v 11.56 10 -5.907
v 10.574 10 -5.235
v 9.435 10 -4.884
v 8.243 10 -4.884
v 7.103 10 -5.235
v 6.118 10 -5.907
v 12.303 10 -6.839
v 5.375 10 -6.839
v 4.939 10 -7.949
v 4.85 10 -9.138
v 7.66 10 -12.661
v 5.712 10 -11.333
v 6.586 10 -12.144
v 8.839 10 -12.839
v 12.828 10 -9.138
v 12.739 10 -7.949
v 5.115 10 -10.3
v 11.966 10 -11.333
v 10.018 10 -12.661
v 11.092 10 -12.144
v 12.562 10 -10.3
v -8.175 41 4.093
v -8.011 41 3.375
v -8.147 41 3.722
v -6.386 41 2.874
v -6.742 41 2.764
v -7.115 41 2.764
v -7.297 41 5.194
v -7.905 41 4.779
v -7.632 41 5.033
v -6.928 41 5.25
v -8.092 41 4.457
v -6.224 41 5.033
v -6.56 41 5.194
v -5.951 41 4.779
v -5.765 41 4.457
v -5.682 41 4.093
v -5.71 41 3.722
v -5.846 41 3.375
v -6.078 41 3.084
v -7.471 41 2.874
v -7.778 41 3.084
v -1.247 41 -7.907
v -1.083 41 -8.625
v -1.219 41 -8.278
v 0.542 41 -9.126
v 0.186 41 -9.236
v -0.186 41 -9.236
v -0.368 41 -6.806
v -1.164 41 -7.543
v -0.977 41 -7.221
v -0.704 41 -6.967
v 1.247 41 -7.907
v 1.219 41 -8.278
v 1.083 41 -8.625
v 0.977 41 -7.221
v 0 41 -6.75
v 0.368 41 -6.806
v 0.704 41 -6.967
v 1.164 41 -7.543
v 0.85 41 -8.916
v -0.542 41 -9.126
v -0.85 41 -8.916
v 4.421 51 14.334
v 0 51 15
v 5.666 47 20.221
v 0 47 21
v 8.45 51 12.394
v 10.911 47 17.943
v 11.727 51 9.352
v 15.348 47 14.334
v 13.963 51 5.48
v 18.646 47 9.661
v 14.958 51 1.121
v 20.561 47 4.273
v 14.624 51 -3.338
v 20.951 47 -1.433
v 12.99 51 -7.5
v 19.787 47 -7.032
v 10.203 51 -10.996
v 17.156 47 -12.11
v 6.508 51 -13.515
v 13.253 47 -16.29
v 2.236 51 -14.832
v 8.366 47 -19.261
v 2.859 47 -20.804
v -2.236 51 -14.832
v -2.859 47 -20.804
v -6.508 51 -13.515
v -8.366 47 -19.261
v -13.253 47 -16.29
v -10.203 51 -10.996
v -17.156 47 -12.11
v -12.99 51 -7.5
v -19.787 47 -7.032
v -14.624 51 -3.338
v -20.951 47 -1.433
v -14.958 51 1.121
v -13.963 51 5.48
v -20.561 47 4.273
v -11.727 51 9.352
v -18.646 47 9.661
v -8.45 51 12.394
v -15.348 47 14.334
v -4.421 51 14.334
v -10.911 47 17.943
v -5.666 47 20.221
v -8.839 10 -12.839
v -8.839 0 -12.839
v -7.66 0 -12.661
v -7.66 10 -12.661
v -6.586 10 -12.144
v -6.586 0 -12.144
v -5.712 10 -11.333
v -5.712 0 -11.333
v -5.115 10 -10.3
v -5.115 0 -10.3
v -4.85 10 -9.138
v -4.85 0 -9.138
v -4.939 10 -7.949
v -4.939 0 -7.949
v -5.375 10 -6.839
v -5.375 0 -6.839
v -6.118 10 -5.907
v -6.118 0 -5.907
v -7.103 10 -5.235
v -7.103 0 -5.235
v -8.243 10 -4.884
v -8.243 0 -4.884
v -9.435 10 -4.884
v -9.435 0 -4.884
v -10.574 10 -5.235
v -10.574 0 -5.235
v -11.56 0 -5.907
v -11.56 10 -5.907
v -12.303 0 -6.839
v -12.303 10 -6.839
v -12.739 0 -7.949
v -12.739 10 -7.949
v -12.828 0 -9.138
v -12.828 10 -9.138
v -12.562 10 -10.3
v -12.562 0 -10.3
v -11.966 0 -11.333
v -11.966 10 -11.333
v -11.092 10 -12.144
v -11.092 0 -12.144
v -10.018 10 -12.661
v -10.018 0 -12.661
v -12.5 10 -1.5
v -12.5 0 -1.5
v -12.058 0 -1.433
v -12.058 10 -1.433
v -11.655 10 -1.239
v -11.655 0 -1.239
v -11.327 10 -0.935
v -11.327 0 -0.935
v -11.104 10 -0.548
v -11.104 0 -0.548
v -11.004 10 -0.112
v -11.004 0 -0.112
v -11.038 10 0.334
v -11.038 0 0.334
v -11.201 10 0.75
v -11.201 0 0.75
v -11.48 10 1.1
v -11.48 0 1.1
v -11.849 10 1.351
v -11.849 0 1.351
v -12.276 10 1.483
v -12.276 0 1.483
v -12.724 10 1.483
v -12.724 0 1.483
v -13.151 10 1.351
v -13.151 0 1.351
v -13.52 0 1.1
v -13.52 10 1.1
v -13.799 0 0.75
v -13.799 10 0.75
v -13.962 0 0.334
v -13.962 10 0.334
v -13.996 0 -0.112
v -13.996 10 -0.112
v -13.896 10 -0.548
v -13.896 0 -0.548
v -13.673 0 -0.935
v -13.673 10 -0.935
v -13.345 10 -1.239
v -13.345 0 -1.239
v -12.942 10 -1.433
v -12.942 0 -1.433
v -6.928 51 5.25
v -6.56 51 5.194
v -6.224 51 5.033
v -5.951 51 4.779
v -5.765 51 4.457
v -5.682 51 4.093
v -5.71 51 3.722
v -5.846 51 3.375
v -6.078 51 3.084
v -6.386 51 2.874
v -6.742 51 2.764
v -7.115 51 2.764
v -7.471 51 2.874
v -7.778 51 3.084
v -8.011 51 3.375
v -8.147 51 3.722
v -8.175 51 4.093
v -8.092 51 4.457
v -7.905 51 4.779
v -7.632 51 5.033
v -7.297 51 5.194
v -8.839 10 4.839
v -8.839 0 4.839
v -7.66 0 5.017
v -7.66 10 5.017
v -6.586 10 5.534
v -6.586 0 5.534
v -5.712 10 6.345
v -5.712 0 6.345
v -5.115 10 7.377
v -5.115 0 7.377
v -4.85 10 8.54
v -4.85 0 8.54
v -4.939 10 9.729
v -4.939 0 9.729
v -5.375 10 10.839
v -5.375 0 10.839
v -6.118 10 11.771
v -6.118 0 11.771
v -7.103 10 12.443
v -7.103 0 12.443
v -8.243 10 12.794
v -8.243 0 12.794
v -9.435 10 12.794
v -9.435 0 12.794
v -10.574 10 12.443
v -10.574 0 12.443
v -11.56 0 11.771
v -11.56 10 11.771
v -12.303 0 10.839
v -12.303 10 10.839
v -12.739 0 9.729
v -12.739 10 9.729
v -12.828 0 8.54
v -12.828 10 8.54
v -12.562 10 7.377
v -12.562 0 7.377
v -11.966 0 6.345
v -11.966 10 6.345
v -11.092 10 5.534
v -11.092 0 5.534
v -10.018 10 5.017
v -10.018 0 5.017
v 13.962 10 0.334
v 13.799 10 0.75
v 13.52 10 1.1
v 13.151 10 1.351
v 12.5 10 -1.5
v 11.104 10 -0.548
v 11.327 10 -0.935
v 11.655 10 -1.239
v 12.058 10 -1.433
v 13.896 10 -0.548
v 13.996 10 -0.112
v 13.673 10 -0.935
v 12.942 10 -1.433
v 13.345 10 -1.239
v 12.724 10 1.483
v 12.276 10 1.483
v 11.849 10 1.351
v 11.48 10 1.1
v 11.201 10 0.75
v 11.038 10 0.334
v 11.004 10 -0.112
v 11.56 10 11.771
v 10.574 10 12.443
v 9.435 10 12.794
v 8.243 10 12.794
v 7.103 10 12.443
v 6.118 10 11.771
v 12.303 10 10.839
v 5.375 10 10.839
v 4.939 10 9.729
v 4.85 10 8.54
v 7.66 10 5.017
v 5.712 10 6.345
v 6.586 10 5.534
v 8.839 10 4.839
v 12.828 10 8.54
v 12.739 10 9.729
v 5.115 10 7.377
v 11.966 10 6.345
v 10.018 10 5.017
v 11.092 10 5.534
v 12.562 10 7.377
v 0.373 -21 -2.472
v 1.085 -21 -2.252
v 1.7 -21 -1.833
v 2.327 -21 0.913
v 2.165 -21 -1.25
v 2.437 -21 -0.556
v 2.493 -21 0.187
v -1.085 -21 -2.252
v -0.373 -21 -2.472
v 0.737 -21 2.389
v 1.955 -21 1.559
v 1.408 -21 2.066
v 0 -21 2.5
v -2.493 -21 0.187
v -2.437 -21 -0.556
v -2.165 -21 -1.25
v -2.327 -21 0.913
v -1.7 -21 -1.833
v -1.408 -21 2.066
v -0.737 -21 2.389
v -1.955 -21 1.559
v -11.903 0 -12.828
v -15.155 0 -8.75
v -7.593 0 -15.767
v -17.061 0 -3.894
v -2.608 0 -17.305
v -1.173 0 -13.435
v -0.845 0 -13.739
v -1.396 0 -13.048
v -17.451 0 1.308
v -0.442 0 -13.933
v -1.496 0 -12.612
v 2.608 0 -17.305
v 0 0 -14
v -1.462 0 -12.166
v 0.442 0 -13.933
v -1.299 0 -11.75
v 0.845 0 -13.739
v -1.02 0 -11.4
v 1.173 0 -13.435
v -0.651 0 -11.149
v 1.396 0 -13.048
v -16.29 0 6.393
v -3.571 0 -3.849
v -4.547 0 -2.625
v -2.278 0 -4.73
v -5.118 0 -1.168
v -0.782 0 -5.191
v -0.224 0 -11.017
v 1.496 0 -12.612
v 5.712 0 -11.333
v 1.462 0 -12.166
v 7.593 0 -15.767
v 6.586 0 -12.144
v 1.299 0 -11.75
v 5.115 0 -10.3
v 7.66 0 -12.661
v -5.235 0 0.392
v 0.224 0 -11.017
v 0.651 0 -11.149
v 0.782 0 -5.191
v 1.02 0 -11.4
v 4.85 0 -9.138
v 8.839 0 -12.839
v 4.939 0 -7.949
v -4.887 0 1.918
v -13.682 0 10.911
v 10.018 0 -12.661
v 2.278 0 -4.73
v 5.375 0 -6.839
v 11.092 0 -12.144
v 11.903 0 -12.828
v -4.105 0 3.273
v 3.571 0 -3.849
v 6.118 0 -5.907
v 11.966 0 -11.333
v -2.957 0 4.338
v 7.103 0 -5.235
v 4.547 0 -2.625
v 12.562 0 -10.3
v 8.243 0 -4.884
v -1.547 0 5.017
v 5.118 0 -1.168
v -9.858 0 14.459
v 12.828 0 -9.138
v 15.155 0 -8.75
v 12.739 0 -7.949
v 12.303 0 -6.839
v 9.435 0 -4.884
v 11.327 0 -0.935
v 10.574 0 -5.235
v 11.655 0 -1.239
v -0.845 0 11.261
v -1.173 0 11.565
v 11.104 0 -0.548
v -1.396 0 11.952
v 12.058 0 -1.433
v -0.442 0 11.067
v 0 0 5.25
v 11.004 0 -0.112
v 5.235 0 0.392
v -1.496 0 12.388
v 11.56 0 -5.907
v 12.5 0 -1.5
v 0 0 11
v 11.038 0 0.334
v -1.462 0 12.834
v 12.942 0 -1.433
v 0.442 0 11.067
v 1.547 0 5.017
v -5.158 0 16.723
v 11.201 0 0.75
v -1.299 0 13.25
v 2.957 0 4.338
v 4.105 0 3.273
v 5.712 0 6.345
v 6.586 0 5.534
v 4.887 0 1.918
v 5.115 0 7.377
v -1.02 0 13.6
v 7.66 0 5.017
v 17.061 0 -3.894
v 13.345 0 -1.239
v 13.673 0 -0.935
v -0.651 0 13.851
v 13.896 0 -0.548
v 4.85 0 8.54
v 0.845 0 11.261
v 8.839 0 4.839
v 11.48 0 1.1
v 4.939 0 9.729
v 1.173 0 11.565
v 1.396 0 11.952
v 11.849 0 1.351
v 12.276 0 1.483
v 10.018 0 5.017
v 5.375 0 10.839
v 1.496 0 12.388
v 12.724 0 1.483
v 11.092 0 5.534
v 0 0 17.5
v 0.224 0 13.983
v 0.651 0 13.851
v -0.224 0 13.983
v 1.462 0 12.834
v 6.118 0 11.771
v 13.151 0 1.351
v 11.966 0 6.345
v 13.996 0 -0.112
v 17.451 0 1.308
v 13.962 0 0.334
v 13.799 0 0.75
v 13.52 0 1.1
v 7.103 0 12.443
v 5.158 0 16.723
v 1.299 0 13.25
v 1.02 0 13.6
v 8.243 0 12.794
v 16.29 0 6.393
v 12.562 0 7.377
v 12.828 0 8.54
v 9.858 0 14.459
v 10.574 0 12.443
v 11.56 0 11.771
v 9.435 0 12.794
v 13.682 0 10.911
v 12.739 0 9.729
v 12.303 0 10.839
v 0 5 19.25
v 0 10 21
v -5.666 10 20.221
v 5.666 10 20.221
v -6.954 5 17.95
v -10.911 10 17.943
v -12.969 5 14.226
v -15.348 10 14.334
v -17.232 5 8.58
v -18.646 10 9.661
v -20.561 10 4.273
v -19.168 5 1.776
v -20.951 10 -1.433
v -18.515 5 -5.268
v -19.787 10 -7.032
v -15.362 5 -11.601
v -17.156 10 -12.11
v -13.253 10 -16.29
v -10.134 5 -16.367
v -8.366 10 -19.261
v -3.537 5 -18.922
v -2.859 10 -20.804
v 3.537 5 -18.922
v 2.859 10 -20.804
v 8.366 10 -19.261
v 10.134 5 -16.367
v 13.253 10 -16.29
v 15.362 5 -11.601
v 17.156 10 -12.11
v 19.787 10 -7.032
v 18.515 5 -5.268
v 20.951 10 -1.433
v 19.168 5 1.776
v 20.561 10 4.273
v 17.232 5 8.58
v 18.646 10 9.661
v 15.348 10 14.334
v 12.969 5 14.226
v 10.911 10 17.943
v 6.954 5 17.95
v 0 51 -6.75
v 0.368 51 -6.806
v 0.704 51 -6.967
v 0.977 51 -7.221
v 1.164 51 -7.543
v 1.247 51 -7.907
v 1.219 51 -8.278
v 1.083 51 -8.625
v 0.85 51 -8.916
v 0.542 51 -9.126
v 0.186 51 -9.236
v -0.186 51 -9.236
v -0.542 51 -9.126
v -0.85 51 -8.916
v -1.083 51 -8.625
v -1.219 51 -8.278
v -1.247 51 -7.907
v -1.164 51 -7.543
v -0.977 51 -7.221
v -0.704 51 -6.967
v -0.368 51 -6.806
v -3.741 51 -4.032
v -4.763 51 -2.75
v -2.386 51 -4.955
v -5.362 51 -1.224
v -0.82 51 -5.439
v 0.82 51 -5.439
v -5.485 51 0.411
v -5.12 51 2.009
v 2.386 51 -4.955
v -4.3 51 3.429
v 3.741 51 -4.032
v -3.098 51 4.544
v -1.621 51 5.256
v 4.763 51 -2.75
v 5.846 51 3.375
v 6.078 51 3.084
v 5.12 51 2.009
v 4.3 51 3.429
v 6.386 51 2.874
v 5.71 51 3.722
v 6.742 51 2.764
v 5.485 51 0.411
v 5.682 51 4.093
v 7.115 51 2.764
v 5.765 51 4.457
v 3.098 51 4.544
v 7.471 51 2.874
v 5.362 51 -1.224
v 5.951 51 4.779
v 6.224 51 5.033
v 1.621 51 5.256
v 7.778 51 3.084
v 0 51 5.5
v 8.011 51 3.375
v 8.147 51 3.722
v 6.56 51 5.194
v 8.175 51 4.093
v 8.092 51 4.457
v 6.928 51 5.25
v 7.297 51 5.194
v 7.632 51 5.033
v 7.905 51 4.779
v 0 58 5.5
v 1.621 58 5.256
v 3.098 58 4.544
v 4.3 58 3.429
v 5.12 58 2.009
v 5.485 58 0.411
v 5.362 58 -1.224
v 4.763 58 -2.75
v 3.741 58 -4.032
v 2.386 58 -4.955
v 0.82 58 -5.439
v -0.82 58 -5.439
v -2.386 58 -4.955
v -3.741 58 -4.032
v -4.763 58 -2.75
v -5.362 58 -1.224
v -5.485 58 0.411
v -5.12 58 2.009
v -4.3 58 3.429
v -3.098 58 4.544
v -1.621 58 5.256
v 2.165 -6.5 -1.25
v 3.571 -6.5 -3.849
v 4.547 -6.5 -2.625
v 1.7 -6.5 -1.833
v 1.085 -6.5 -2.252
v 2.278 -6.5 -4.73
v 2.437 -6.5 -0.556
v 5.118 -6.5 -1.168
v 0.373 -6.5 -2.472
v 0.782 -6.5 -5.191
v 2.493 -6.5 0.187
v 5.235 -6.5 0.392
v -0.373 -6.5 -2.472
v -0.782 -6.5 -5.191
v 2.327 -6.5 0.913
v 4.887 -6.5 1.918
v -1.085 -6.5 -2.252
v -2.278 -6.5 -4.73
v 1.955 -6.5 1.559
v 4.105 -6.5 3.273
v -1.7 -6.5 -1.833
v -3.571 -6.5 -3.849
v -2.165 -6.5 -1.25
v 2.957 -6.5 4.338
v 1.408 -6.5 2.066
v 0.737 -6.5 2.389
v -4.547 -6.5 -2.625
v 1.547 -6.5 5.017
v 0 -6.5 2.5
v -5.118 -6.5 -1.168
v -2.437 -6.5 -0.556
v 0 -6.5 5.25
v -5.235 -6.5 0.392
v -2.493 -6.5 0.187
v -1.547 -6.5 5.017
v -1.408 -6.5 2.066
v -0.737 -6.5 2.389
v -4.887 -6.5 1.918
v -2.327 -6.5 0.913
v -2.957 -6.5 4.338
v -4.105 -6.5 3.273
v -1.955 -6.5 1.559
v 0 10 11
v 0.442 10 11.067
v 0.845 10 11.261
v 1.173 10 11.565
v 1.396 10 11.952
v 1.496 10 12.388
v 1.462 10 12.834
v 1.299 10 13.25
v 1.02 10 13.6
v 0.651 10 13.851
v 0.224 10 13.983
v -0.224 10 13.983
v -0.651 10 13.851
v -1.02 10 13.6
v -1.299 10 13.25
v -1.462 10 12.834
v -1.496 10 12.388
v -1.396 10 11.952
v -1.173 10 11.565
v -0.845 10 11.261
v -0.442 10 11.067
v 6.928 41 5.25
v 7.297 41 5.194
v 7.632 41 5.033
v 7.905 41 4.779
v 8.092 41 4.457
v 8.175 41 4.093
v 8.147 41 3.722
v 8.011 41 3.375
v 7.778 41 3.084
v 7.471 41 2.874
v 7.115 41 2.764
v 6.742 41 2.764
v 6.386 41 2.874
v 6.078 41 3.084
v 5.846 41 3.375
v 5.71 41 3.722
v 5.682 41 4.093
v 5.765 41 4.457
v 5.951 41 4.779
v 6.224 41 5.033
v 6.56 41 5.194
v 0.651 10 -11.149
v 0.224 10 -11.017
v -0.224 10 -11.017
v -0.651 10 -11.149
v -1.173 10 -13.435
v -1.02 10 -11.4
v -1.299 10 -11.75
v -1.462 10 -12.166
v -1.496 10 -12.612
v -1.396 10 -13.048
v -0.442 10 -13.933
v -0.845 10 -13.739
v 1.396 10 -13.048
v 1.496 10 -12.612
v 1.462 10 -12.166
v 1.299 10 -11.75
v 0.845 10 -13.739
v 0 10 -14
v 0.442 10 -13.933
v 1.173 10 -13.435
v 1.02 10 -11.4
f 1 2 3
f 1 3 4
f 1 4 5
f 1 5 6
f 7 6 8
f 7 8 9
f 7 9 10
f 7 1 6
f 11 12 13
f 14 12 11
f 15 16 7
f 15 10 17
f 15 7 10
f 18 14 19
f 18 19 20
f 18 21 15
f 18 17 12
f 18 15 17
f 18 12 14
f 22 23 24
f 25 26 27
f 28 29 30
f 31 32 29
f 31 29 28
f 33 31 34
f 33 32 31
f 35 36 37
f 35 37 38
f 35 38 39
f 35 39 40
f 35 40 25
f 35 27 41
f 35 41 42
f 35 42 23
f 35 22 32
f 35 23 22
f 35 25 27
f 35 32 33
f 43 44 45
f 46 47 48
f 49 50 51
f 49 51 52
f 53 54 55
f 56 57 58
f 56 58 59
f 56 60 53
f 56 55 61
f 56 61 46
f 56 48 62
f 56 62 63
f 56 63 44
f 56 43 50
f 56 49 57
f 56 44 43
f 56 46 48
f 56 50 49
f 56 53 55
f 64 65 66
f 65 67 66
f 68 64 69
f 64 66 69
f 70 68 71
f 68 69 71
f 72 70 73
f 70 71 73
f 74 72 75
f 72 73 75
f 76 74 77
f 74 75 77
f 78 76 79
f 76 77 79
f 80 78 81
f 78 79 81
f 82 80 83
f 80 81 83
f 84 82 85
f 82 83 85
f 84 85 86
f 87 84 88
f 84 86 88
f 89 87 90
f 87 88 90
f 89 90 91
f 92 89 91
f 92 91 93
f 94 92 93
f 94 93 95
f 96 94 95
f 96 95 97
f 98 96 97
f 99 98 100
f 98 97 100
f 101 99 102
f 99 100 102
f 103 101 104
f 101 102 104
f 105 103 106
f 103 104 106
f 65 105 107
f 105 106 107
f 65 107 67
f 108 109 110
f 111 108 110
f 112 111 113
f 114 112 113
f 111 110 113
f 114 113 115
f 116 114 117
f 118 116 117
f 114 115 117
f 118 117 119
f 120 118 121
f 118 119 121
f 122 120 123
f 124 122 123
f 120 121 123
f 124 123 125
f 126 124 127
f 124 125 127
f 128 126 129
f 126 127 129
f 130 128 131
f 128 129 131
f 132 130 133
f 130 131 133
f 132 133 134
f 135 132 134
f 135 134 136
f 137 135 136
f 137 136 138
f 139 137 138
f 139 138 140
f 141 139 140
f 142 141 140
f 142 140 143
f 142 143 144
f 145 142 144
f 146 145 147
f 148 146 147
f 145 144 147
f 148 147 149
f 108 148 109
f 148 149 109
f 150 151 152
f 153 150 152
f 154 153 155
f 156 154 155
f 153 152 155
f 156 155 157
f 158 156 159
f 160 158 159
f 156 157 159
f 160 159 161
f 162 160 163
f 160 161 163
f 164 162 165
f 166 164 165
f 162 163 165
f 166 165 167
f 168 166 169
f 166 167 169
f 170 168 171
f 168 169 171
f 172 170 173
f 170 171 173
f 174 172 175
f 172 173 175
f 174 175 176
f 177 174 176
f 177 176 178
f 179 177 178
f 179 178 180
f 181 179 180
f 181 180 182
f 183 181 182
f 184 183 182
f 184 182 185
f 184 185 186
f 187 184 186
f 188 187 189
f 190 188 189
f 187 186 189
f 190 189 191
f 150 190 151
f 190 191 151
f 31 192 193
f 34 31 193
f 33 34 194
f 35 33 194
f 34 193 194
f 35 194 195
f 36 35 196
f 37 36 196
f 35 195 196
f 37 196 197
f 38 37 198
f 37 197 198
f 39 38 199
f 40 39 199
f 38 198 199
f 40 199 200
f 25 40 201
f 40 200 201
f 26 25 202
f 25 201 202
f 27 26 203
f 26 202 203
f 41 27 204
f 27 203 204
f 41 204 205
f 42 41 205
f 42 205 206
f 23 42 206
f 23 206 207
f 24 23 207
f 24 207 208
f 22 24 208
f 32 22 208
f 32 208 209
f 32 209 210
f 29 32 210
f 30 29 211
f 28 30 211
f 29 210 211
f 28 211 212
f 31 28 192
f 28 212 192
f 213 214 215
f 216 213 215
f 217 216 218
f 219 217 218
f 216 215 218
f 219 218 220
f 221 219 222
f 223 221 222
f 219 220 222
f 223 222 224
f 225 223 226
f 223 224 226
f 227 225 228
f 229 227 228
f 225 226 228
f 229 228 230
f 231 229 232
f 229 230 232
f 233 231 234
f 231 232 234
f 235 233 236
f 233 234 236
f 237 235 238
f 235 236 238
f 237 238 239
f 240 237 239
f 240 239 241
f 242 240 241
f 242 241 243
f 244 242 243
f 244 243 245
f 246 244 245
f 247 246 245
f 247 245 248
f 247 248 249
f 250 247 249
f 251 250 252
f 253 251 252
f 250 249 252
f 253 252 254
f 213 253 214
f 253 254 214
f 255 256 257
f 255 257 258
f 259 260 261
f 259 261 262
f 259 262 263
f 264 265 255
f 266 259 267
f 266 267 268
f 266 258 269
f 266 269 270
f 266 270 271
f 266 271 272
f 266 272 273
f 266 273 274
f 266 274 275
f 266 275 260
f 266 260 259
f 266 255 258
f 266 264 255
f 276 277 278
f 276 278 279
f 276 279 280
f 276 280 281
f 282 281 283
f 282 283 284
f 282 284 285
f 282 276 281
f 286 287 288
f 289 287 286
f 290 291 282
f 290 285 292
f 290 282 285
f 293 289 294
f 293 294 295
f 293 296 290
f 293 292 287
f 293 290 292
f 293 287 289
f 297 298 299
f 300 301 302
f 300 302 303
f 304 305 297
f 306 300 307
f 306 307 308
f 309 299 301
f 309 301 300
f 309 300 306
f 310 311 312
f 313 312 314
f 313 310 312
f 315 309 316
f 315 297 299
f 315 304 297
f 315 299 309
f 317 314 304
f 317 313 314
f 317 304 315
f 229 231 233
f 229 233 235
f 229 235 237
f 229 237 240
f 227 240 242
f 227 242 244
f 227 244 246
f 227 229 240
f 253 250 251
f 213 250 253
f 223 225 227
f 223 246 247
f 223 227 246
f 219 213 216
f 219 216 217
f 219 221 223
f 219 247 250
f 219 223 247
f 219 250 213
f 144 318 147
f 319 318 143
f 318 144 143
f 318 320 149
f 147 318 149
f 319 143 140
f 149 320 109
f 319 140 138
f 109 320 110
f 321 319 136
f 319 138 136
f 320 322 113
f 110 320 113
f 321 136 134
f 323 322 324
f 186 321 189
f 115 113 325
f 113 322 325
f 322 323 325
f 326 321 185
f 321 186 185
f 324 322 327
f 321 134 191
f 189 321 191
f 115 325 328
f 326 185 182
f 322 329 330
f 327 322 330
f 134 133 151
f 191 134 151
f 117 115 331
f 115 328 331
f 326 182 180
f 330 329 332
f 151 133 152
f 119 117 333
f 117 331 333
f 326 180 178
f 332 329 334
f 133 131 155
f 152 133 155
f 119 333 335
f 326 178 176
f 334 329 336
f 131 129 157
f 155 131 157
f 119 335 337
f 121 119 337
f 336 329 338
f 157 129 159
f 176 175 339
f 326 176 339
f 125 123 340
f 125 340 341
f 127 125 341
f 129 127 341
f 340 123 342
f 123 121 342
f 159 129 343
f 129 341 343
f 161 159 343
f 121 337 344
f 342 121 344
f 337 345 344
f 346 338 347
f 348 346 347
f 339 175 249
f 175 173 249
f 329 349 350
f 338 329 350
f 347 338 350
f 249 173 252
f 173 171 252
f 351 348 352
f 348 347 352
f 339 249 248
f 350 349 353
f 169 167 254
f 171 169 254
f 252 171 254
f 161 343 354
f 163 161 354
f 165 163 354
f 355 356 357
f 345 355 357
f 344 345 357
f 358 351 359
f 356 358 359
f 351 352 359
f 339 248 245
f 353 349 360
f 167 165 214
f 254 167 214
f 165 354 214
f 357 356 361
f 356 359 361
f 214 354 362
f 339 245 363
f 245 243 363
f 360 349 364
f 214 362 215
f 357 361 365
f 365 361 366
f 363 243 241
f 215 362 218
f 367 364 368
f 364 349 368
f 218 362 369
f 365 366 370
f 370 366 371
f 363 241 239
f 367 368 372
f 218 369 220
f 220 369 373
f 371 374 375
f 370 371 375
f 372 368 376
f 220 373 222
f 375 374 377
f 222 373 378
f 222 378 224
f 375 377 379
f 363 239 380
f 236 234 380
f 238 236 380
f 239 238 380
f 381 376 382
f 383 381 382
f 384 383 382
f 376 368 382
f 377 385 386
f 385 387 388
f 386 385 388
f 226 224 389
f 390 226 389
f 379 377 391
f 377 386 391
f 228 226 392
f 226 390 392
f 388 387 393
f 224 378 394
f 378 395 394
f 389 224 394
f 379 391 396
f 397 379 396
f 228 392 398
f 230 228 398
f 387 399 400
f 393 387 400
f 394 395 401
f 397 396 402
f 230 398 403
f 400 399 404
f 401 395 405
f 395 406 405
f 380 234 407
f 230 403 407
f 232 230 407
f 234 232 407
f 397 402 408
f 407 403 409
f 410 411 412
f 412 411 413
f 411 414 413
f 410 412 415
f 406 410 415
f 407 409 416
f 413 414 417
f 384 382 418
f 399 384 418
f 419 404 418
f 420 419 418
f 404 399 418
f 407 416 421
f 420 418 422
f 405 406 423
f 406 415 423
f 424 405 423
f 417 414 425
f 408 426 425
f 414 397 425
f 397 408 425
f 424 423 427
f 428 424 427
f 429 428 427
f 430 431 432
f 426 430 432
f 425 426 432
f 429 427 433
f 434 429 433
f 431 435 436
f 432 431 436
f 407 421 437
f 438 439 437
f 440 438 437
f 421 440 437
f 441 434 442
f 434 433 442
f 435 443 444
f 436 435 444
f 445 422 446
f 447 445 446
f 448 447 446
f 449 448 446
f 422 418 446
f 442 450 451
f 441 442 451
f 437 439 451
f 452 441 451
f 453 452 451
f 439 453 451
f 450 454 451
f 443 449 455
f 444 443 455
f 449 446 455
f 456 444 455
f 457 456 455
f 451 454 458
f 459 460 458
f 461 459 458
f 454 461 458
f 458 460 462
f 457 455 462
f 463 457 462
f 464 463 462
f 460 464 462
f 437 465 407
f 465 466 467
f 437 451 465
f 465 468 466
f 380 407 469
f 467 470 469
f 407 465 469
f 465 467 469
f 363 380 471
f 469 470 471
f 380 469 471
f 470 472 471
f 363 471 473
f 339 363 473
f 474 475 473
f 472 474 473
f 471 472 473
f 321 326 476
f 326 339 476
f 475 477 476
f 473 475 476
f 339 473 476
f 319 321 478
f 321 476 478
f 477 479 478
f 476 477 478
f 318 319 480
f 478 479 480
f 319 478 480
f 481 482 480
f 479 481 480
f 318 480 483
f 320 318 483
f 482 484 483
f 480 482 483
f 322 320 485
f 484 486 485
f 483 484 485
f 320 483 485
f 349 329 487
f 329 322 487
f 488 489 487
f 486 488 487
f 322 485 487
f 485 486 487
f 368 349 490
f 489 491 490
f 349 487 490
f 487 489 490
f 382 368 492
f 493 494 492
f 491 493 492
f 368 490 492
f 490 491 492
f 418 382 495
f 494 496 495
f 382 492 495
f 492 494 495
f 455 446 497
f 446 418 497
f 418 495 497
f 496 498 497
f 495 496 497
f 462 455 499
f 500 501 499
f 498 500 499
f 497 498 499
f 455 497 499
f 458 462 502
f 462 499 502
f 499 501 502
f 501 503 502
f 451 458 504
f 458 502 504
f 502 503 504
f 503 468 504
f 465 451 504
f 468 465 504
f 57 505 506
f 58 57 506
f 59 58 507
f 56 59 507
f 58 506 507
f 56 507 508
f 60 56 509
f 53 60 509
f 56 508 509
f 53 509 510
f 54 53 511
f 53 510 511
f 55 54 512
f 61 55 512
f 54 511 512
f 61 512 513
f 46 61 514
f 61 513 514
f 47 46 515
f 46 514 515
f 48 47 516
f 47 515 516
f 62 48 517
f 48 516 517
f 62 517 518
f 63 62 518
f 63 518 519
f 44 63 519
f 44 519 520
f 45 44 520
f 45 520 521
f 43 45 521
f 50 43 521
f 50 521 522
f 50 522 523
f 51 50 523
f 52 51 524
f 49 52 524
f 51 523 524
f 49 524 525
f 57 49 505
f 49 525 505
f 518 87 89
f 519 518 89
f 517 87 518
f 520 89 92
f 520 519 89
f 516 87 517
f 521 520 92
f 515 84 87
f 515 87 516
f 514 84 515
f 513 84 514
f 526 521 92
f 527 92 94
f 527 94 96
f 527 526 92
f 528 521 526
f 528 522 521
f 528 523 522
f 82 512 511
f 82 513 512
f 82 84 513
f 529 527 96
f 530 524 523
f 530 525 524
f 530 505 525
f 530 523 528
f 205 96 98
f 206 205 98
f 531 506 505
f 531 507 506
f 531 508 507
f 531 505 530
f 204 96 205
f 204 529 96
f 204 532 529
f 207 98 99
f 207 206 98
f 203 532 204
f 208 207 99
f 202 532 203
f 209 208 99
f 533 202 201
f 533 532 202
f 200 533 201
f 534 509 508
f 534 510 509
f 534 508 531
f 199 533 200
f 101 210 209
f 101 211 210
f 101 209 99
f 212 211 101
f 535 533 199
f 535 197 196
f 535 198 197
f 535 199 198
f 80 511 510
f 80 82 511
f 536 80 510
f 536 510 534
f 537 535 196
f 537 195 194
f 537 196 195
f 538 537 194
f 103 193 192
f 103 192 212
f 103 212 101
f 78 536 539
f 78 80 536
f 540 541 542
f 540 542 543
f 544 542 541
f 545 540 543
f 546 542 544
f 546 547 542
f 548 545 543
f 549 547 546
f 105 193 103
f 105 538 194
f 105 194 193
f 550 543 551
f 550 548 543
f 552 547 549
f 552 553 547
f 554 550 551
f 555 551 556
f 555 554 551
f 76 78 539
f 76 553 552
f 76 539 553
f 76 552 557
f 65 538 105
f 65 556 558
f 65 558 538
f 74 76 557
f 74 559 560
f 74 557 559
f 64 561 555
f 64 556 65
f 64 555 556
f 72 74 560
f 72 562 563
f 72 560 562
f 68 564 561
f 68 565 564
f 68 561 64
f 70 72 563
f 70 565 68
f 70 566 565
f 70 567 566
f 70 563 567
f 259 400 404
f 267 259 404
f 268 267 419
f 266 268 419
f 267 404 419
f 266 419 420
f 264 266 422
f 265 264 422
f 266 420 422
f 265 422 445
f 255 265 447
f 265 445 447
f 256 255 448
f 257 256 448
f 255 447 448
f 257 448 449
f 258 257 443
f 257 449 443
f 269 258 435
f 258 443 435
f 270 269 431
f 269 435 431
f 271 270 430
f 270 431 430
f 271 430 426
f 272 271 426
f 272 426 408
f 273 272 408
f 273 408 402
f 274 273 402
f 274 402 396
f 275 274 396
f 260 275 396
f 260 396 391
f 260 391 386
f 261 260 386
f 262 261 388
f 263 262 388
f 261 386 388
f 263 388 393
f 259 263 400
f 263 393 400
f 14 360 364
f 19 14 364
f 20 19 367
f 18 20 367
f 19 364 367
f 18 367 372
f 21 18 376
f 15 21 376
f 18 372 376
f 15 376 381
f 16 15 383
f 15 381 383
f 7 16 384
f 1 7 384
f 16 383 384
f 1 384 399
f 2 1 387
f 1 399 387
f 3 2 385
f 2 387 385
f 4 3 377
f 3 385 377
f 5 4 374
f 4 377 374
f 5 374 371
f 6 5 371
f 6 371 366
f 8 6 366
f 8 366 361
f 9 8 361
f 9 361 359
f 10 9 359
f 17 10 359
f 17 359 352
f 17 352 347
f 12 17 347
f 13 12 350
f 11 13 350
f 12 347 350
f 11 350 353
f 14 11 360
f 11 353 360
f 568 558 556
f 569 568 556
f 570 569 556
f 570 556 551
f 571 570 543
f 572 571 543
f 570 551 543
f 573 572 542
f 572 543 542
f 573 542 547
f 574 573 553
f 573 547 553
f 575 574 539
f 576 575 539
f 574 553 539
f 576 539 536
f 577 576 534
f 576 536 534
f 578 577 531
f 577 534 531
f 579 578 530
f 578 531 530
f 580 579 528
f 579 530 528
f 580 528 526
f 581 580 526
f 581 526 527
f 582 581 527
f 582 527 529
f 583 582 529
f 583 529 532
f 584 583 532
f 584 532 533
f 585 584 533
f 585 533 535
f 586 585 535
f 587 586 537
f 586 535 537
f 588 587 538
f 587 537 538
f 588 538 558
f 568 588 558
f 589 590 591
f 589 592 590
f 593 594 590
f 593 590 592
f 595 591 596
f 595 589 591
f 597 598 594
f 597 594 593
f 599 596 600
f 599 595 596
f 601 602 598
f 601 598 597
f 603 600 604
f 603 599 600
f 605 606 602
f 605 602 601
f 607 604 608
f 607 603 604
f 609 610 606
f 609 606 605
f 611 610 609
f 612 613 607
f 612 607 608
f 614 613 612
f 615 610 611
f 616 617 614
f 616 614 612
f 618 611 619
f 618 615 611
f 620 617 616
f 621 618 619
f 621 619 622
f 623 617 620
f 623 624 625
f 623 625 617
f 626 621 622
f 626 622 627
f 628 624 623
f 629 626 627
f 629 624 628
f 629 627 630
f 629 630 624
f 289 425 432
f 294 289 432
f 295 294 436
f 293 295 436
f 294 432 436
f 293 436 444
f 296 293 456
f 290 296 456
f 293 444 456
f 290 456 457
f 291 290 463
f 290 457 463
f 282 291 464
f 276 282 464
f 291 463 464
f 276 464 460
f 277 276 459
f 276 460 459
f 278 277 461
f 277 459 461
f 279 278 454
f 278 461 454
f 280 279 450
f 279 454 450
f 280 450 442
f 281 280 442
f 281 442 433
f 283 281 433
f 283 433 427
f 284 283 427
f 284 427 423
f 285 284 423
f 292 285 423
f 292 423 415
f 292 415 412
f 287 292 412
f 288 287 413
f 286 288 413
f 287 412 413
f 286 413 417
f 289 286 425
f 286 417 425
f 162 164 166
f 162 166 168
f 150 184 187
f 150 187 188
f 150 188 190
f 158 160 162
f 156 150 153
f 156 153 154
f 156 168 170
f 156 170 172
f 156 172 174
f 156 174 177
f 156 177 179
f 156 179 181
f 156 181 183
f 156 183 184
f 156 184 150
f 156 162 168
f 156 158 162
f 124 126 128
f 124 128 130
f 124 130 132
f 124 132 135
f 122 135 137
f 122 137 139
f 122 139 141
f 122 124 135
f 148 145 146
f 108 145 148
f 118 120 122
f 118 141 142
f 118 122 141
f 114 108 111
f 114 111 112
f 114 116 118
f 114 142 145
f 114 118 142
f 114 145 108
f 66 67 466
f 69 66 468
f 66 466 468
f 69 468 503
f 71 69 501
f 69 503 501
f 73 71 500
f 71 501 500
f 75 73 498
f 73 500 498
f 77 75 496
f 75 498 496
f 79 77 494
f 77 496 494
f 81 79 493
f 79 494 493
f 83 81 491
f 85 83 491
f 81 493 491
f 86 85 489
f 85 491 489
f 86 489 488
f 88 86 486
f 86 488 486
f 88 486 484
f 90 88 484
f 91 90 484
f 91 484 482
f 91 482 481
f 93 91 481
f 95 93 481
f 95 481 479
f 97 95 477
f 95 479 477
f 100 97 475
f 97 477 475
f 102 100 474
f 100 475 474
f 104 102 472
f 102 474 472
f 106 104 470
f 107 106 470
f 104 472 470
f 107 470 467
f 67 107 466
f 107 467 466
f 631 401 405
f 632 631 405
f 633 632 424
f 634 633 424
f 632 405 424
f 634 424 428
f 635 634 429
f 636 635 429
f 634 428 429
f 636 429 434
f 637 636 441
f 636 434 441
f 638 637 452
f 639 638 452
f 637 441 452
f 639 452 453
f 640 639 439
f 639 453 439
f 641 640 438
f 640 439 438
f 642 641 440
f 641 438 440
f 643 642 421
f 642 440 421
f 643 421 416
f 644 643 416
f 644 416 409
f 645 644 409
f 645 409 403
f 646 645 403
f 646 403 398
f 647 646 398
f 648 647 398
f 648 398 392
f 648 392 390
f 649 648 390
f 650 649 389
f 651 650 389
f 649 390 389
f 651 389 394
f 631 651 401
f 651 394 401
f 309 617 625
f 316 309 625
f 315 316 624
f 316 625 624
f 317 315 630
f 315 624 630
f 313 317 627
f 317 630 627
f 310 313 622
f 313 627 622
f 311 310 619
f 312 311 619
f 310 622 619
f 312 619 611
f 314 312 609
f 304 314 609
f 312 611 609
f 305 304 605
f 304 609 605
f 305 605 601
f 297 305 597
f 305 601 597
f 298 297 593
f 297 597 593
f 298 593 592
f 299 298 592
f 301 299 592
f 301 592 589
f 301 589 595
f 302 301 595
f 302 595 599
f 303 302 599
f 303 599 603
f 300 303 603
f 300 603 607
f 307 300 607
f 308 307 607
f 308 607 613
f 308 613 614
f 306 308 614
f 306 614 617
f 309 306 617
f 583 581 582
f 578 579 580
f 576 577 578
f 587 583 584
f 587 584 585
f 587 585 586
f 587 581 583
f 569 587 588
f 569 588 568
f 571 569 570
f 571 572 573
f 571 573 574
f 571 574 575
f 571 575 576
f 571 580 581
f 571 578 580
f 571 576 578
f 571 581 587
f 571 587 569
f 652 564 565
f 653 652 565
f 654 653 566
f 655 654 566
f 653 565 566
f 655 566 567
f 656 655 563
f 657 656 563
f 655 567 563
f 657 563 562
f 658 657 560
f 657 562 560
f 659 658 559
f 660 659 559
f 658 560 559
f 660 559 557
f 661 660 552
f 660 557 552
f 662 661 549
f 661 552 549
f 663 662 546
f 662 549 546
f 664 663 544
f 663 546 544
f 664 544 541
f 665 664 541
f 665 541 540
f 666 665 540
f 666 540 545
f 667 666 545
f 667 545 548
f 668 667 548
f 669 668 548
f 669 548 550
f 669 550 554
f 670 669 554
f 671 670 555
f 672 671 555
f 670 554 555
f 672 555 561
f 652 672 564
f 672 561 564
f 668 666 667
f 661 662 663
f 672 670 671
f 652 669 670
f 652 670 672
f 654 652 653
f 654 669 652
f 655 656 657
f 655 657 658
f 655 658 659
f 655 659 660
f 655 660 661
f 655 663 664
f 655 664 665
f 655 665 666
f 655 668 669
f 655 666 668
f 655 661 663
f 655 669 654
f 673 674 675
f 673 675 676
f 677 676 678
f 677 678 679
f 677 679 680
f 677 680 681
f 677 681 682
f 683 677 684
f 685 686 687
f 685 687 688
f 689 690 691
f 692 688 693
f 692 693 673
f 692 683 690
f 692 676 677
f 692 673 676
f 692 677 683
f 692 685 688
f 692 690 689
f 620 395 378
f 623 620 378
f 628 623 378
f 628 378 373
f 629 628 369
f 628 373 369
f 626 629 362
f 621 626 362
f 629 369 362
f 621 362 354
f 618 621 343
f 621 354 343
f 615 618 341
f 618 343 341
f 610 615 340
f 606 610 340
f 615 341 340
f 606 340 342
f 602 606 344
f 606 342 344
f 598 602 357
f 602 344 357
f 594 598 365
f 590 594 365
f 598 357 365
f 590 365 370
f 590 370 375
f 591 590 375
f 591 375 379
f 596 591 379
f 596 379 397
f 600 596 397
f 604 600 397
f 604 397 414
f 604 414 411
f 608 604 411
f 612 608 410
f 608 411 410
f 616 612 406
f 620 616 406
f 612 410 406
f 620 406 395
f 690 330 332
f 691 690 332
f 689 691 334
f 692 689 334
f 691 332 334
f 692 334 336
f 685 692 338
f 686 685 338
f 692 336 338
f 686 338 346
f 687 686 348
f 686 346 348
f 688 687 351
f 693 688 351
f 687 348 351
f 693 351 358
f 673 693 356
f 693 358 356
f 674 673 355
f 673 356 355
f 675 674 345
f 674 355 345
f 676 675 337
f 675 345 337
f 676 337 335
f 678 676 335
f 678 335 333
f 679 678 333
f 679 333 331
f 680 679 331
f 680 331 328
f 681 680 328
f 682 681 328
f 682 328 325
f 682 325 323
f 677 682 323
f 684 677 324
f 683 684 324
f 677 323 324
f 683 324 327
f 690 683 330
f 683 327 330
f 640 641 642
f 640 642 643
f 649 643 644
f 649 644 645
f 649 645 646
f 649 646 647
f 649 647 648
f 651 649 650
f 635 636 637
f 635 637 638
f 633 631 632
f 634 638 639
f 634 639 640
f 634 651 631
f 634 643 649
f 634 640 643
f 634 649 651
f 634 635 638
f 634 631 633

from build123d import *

# Parameters (mm, degrees)
SKETCH1_R           = 17.5
BOSS_EXTRUDE1_DEPTH = 10
SKETCH2_R           = 21
BOSS_EXTRUDE2_DEPTH = 37
SKETCH3_R           = 15
BOSS_EXTRUDE3_DEPTH = 4
SKETCH4_R           = 5.5
BOSS_EXTRUDE4_DEPTH = 7
SKETCH5_R           = 2.5
BOSS_EXTRUDE5_DEPTH = 21
SKETCH6_R           = 1.5
SKETCH6_R_2         = 4
CUT_EXTRUDE1_DEPTH  = 10
SKETCH7_R           = 5.25
BOSS_EXTRUDE6_DEPTH = 6.5
SKETCH9_R           = 1.25
CUT_EXTRUDE2_DEPTH  = 10


with BuildPart() as part:
    # Sketch1 → Boss-Extrude1 (new body)
    with BuildSketch(Plane(origin=(0, 0, 0), x_dir=(1, 0, 0), z_dir=(0, 1, 0))):
        with Locations(Location((0, 0, 0), (0, 0, 270))):
            Circle(SKETCH1_R)
    extrude(amount=BOSS_EXTRUDE1_DEPTH)

    # Sketch2 → Boss-Extrude2 (add)
    with BuildSketch(Plane(origin=(0, 10, 0), x_dir=(1, 0, 0), z_dir=(0, 1, 0))):
        with Locations(Location((0, 0, 0), (0, 0, 270))):
            Circle(SKETCH2_R)
    extrude(amount=BOSS_EXTRUDE2_DEPTH)

    # Sketch3 → Boss-Extrude3 (add)
    with BuildSketch(Plane(origin=(0, 47, 0), x_dir=(1, 0, 0), z_dir=(0, 1, 0))):
        with Locations(Location((0, 0, 0), (0, 0, 270))):
            Circle(SKETCH3_R)
    extrude(amount=BOSS_EXTRUDE3_DEPTH)

    # Sketch4 → Boss-Extrude4 (add)
    with BuildSketch(Plane(origin=(0, 51, 0), x_dir=(1, 0, 0), z_dir=(0, 1, 0))):
        with Locations(Location((0, 0, 0), (0, 0, 270))):
            Circle(SKETCH4_R)
    extrude(amount=BOSS_EXTRUDE4_DEPTH)

    # Sketch5 → Boss-Extrude5 (add)
    with BuildSketch(Plane.XZ):
        with Locations(Location((0, 0, 0), (0, 0, 90))):
            Circle(SKETCH5_R)
    extrude(amount=BOSS_EXTRUDE5_DEPTH)

    # loft up to a face of the part (loft1)
    loft([Face(Wire([part.edges().sort_by_distance((-12.75695098, 0, -11.979574354))[0]])), Face(Wire([part.edges().sort_by_distance((-15.308341176, 10, -14.375489225))[0]]))])

    # loft up to a face of the part (loft2)
    loft([Face(Wire([part.edges().sort_by_distance((10.934529411, 51, -10.268206589))[0]])), Face(Wire([part.edges().sort_by_distance((15.308341176, 47, -14.375489225))[0]]))])

    # Sketch6 → Cut-Extrude1 (cut)
    with BuildSketch(Plane.XZ):
        with Locations(Location((0, 12.5, 0), (0, 0, 270))):
            Circle(SKETCH6_R)
        with Locations(Location((12.5, 0, 0), (0, 0, 270))):
            Circle(SKETCH6_R)
        with Locations(Location((0, -12.5, 0), (0, 0, 270))):
            Circle(SKETCH6_R)
        with Locations(Location((-12.5, 0, 0), (0, 0, 270))):
            Circle(SKETCH6_R)
        with Locations(Location((-8.838834765, 8.838834765, 0), (0, 0, 270))):
            Circle(SKETCH6_R_2)
        with Locations(Location((8.838834765, 8.838834765, 0), (0, 0, 270))):
            Circle(SKETCH6_R_2)
        with Locations(Location((8.838834765, -8.838834765, 0), (0, 0, 270))):
            Circle(SKETCH6_R_2)
        with Locations(Location((-8.838834765, -8.838834765, 0), (0, 0, 270))):
            Circle(SKETCH6_R_2)
    extrude(amount=-CUT_EXTRUDE1_DEPTH, mode=Mode.SUBTRACT)

    # Sketch7 → Boss-Extrude6 (add)
    with BuildSketch(Plane.XZ):
        with Locations(Location((0, 0, 0), (0, 0, 90))):
            Circle(SKETCH7_R)
    extrude(amount=BOSS_EXTRUDE6_DEPTH)

    # Sketch9 → Cut-Extrude2 (cut)
    with BuildSketch(Plane(origin=(0, 51, 0), x_dir=(1, 0, 0), z_dir=(0, 1, 0))):
        with Locations(Location((0, 8, 0), (0, 0, 270))):
            Circle(SKETCH9_R)
        with Locations(Location((6.92820323, -4, 0), (0, 0, 270))):
            Circle(SKETCH9_R)
        with Locations(Location((-6.92820323, -4, 0), (0, 0, 270))):
            Circle(SKETCH9_R)
    extrude(amount=-CUT_EXTRUDE2_DEPTH, mode=Mode.SUBTRACT)


solid = part.part
